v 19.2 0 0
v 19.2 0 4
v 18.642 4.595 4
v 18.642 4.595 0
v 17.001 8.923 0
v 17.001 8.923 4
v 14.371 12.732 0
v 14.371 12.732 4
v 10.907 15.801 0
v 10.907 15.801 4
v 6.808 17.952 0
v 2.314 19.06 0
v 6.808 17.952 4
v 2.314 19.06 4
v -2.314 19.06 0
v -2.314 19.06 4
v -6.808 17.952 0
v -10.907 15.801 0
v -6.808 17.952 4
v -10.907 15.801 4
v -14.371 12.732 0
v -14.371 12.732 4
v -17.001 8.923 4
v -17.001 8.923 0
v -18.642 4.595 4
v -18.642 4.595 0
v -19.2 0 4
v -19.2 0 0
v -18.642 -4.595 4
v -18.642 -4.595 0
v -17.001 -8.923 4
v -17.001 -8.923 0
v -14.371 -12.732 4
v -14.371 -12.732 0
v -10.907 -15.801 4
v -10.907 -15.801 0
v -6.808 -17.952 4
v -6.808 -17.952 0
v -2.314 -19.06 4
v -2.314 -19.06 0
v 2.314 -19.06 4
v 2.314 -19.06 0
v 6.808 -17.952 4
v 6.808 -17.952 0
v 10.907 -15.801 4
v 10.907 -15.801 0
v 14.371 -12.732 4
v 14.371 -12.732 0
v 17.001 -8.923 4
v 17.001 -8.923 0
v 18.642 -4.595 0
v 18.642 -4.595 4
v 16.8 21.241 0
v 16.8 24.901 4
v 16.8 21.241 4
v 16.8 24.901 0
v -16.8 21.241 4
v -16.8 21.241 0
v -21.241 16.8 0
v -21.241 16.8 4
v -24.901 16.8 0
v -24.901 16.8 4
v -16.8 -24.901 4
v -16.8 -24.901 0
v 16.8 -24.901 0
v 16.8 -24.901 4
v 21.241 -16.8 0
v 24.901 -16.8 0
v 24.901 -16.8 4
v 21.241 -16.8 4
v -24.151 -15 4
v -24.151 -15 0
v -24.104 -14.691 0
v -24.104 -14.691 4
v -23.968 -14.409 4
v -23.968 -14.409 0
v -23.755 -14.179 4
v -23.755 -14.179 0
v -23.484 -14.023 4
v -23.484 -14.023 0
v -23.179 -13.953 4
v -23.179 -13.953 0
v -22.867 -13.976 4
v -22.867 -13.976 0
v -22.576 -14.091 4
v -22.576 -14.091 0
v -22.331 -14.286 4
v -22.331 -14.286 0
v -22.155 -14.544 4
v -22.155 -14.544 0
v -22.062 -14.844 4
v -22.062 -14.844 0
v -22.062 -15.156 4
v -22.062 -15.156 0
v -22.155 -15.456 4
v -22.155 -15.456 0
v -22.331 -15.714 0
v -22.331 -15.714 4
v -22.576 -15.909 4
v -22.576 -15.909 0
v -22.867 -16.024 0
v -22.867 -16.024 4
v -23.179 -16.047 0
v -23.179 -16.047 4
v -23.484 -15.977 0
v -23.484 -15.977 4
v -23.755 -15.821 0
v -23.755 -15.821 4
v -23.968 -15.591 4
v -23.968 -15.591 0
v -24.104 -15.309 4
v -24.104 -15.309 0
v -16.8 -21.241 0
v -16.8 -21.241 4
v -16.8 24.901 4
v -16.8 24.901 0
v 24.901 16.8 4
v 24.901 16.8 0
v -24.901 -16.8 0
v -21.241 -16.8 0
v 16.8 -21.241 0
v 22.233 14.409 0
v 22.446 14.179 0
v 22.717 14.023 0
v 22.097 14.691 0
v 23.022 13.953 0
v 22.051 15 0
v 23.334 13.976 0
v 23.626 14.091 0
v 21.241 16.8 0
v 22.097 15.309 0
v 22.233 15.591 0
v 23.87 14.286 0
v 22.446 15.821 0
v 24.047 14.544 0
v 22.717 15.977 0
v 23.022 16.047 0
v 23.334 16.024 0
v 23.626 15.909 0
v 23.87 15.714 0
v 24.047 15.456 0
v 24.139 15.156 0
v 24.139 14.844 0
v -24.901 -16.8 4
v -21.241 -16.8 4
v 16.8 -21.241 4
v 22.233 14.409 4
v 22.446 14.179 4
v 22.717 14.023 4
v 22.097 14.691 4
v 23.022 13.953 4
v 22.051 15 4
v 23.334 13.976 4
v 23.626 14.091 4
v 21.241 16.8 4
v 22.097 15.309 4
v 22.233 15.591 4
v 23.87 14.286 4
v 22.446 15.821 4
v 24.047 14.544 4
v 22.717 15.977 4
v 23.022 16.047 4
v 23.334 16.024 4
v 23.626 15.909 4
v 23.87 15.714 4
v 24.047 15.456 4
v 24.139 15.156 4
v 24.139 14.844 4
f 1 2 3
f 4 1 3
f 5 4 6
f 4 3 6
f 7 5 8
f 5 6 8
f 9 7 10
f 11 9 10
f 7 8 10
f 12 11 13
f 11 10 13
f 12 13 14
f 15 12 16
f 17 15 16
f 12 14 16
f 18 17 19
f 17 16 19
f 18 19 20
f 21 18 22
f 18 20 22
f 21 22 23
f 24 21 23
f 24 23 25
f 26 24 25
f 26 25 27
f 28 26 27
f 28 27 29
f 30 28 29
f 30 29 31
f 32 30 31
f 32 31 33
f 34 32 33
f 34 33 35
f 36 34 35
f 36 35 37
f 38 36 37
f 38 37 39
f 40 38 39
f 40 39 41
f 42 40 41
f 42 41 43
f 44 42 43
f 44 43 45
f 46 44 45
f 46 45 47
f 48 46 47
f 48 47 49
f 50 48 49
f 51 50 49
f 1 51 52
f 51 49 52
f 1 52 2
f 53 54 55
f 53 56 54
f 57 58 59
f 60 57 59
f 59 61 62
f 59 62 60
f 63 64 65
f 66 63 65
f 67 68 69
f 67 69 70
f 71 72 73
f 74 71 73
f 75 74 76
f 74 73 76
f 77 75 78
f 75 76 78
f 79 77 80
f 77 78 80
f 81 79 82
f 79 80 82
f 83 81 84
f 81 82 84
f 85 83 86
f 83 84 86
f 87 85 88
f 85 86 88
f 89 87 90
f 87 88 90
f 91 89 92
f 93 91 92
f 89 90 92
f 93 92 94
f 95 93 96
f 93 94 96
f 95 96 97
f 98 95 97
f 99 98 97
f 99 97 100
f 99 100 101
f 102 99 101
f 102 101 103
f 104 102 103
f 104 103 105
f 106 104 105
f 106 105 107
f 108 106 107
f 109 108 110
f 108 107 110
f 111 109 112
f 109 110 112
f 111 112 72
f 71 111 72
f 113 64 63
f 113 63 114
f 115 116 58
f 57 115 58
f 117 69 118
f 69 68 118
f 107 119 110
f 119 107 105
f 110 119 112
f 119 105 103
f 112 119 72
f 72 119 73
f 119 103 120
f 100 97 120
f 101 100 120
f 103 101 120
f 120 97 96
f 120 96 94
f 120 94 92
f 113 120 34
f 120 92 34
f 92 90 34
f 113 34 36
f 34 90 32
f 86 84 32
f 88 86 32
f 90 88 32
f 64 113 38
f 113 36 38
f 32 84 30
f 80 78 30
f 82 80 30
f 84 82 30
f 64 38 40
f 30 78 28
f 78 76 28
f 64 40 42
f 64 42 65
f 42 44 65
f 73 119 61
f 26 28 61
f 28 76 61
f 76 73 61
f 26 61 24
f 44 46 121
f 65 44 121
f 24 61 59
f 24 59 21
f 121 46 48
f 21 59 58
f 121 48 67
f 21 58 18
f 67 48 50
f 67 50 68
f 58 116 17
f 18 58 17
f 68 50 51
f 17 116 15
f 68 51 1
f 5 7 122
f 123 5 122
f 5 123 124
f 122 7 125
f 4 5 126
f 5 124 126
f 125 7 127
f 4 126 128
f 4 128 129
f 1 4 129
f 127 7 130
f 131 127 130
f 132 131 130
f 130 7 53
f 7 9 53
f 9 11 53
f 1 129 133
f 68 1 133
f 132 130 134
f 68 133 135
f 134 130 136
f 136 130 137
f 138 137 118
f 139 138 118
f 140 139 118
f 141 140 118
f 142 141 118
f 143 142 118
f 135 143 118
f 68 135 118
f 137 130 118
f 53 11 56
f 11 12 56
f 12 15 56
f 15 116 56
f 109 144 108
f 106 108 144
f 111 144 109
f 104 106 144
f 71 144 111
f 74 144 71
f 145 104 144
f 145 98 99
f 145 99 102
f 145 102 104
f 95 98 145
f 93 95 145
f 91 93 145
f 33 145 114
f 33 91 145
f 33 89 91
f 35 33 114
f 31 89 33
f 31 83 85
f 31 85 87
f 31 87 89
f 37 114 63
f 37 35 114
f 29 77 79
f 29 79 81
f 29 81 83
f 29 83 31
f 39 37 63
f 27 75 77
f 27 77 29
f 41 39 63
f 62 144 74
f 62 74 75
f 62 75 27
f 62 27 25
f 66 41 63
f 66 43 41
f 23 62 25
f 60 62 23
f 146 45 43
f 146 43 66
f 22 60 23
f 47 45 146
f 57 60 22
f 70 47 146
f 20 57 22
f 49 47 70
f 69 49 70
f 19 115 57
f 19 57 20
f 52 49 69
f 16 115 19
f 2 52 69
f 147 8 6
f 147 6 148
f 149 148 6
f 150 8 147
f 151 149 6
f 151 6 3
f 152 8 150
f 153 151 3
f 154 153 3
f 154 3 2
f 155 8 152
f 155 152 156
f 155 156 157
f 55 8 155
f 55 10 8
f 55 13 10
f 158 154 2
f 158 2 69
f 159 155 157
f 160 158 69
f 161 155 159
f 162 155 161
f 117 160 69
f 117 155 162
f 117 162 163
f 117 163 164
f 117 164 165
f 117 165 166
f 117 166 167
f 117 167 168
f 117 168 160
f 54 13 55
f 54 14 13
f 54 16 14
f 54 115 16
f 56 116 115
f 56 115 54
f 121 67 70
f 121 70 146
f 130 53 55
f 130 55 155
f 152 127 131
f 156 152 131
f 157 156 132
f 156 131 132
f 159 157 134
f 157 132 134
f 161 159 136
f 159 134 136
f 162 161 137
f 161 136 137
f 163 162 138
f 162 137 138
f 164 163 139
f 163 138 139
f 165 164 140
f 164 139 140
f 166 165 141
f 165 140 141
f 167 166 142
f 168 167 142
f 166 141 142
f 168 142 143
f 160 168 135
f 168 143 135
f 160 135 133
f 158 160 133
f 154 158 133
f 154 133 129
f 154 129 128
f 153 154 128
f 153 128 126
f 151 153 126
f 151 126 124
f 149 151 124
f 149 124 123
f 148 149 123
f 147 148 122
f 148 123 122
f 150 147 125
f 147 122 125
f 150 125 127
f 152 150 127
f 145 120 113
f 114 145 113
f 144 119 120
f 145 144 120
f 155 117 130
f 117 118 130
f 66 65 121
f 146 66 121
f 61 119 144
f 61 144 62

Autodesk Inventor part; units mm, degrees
ref_plane "YZ Plane" through (0, 0, 0) normal (1, 0, 0) x (0, 1, 0)
ref_plane "XZ Plane" through (0, 0, 0) normal (0, 1, 0) x (-1, 0, 0)
ref_plane "XY Plane" through (0, 0, 0) normal (0, 0, 1) x (1, 0, 0)
sketch "Sketch1" plane through (0, 0, 0) normal (0, 0, 1) x (1, 0, 0)
  line L0 (-34.8609, 0) -> (34.8609, 0) construction
  line L1 (0, -34.8609) -> (0, 34.8609) construction
  line L2 (0, 0) -> (11.6542, 11.6542) construction
  line L3 (0, 0) -> (16.4815, 0) construction
  line L4 (0, 24.9006) -> (16.8, 24.9006)
  line L5 (16.8, 24.9006) -> (16.8, 21.2406)
  line L6 (16.8, 21.2406) -> (19.0203, 19.0203)
  line L7 (24.9006, 0) -> (24.9006, 16.8)
  line L8 (24.9006, 16.8) -> (21.2406, 16.8)
  line L9 (21.2406, 16.8) -> (19.0203, 19.0203)
  line L10 (0, 0) -> (-11.6542, 11.6542) construction
  line L11 (0, 0) -> (-16.4815, 0) construction
  line L12 (0, 24.9006) -> (-16.8, 24.9006)
  line L13 (-16.8, 24.9006) -> (-16.8, 21.2406)
  line L14 (-16.8, 21.2406) -> (-19.0203, 19.0203)
  line L15 (-24.9006, 0) -> (-24.9006, 16.8)
  line L16 (-24.9006, 16.8) -> (-21.2406, 16.8)
  line L17 (-21.2406, 16.8) -> (-19.0203, 19.0203)
  line L18 (0, 0) -> (11.6542, -11.6542) construction
  line L19 (0, -24.9006) -> (16.8, -24.9006)
  line L20 (16.8, -24.9006) -> (16.8, -21.2406)
  line L21 (16.8, -21.2406) -> (19.0203, -19.0203)
  line L22 (24.9006, 0) -> (24.9006, -16.8)
  line L23 (24.9006, -16.8) -> (21.2406, -16.8)
  line L24 (21.2406, -16.8) -> (19.0203, -19.0203)
  line L25 (0, 0) -> (-11.6542, -11.6542) construction
  line L26 (0, -24.9006) -> (-16.8, -24.9006)
  line L27 (-16.8, -24.9006) -> (-16.8, -21.2406)
  line L28 (-16.8, -21.2406) -> (-19.0203, -19.0203)
  line L29 (-24.9006, 0) -> (-24.9006, -16.8)
  line L30 (-24.9006, -16.8) -> (-21.2406, -16.8)
  line L31 (-21.2406, -16.8) -> (-19.0203, -19.0203)
  dimension "d0" = 45
  dimension "d1" = 3.14
  dimension "d2" = 3.66
  dimension "d3" = 16.8
extrude "Extrusion1" add sketch "Sketch1" along normal blind 4
hole "Hole1" at (0, 0, 0) direction (0, 0, 1) diameter 40 end through all
sketch "Sketch6" plane through (0, 0, 4) normal (0, 0, 1) x (1, 0, 0)
  circle A0 centre (0, 0) radius 20 construction
  line L0 (16.8, 24.9006) -> (-16.8, 24.9006) construction
  line L1 (-16.8, 24.9006) -> (-16.8, 21.2406) construction
  line L2 (-16.8, 21.2406) -> (-21.2406, 16.8) construction
  line L3 (-21.2406, 16.8) -> (-24.9006, 16.8) construction
  line L4 (-24.9006, 16.8) -> (-24.9006, -16.8) construction
  line L5 (-24.9006, -16.8) -> (-21.2406, -16.8) construction
  line L6 (-21.2406, -16.8) -> (-16.8, -21.2406) construction
  line L7 (-16.8, -21.2406) -> (-16.8, -24.9006) construction
  line L8 (-16.8, -24.9006) -> (16.8, -24.9006) construction
  line L9 (16.8, -24.9006) -> (16.8, -21.2406) construction
  line L10 (16.8, -21.2406) -> (21.2406, -16.8) construction
  line L11 (21.2406, -16.8) -> (24.9006, -16.8) construction
  line L12 (24.9006, -16.8) -> (24.9006, 16.8) construction
  line L13 (24.9006, 16.8) -> (21.2406, 16.8) construction
  line L14 (21.2406, 16.8) -> (16.8, 21.2406) construction
  line L15 (16.8, 21.2406) -> (16.8, 24.9006) construction
  circle A1 centre (0, 0) radius 20
  circle A2 centre (0, 0) radius 13.5
  dimension "d42" = 40
  dimension "d43" = 27
extrude "Extrusion4" [suppressed]
sketch "Sketch8" plane through (0, 0, 4) normal (0, 0, 1) x (1, 0, 0)
  line L0 (16.8, 24.9006) -> (-16.8, 24.9006) projected
  line L1 (-16.8, 24.9006) -> (-16.8, 21.2406) projected
  line L2 (-16.8, 21.2406) -> (-21.2406, 16.8) projected
  line L3 (-21.2406, 16.8) -> (-24.9006, 16.8) projected
  line L4 (-24.9006, 16.8) -> (-24.9006, -16.8) projected
  line L5 (-24.9006, -16.8) -> (-21.2406, -16.8) projected
  line L6 (-21.2406, -16.8) -> (-16.8, -21.2406) projected
  line L7 (-16.8, -21.2406) -> (-16.8, -24.9006) projected
  line L8 (-16.8, -24.9006) -> (16.8, -24.9006) projected
  line L9 (16.8, -24.9006) -> (16.8, -21.2406) projected
  line L10 (16.8, -21.2406) -> (21.2406, -16.8) projected
  line L11 (21.2406, -16.8) -> (24.9006, -16.8) projected
  line L12 (24.9006, -16.8) -> (24.9006, 16.8) projected
  line L13 (24.9006, 16.8) -> (21.2406, 16.8) projected
  line L14 (21.2406, 16.8) -> (16.8, 21.2406) projected
  line L15 (16.8, 21.2406) -> (16.8, 24.9006) projected
  line L16 (-23.9006, -15.8) -> (-23.9006, 15.8)
  line L17 (-23.9006, 15.8) -> (-20.8264, 15.8)
  line L18 (-20.8264, 15.8) -> (-15.8, 20.8264)
  line L19 (-15.8, 20.8264) -> (-15.8, 23.9006)
  line L20 (-15.8, 23.9006) -> (15.8, 23.9006)
  line L21 (15.8, 23.9006) -> (15.8, 20.8264)
  line L22 (15.8, 20.8264) -> (20.8264, 15.8)
  line L23 (20.8264, 15.8) -> (23.9006, 15.8)
  line L24 (23.9006, 15.8) -> (23.9006, -15.8)
  line L25 (23.9006, -15.8) -> (20.8264, -15.8)
  line L26 (20.8264, -15.8) -> (15.8, -20.8264)
  line L27 (15.8, -20.8264) -> (15.8, -23.9006)
  line L28 (15.8, -23.9006) -> (-15.8, -23.9006)
  line L29 (-15.8, -23.9006) -> (-15.8, -20.8264)
  line L30 (-15.8, -20.8264) -> (-20.8264, -15.8)
  line L31 (-20.8264, -15.8) -> (-23.9006, -15.8)
  circle A0 centre (0, 0) radius 20 projected
  circle A1 centre (0, 0) radius 19.2
  dimension "d41" = 1
  dimension "d46" = 0.8
extrude "Extrusion6" add sketch "Sketch8" against normal up to surface (4 mm away)
sketch "Sketch9" plane through (0, 0, 0) normal (0, 0, -1) x (-1, 0, 0)
  circle A0 centre (-23.1006, 15) radius 1.05 projected
  circle A1 centre (23.1006, -15) radius 1.05 projected
  point P0 (0, 0)
extrude "Extrusion7" cut sketch "Sketch9" against normal through all
properties part number "20_Cube_Insert_CirAp_Guide"
